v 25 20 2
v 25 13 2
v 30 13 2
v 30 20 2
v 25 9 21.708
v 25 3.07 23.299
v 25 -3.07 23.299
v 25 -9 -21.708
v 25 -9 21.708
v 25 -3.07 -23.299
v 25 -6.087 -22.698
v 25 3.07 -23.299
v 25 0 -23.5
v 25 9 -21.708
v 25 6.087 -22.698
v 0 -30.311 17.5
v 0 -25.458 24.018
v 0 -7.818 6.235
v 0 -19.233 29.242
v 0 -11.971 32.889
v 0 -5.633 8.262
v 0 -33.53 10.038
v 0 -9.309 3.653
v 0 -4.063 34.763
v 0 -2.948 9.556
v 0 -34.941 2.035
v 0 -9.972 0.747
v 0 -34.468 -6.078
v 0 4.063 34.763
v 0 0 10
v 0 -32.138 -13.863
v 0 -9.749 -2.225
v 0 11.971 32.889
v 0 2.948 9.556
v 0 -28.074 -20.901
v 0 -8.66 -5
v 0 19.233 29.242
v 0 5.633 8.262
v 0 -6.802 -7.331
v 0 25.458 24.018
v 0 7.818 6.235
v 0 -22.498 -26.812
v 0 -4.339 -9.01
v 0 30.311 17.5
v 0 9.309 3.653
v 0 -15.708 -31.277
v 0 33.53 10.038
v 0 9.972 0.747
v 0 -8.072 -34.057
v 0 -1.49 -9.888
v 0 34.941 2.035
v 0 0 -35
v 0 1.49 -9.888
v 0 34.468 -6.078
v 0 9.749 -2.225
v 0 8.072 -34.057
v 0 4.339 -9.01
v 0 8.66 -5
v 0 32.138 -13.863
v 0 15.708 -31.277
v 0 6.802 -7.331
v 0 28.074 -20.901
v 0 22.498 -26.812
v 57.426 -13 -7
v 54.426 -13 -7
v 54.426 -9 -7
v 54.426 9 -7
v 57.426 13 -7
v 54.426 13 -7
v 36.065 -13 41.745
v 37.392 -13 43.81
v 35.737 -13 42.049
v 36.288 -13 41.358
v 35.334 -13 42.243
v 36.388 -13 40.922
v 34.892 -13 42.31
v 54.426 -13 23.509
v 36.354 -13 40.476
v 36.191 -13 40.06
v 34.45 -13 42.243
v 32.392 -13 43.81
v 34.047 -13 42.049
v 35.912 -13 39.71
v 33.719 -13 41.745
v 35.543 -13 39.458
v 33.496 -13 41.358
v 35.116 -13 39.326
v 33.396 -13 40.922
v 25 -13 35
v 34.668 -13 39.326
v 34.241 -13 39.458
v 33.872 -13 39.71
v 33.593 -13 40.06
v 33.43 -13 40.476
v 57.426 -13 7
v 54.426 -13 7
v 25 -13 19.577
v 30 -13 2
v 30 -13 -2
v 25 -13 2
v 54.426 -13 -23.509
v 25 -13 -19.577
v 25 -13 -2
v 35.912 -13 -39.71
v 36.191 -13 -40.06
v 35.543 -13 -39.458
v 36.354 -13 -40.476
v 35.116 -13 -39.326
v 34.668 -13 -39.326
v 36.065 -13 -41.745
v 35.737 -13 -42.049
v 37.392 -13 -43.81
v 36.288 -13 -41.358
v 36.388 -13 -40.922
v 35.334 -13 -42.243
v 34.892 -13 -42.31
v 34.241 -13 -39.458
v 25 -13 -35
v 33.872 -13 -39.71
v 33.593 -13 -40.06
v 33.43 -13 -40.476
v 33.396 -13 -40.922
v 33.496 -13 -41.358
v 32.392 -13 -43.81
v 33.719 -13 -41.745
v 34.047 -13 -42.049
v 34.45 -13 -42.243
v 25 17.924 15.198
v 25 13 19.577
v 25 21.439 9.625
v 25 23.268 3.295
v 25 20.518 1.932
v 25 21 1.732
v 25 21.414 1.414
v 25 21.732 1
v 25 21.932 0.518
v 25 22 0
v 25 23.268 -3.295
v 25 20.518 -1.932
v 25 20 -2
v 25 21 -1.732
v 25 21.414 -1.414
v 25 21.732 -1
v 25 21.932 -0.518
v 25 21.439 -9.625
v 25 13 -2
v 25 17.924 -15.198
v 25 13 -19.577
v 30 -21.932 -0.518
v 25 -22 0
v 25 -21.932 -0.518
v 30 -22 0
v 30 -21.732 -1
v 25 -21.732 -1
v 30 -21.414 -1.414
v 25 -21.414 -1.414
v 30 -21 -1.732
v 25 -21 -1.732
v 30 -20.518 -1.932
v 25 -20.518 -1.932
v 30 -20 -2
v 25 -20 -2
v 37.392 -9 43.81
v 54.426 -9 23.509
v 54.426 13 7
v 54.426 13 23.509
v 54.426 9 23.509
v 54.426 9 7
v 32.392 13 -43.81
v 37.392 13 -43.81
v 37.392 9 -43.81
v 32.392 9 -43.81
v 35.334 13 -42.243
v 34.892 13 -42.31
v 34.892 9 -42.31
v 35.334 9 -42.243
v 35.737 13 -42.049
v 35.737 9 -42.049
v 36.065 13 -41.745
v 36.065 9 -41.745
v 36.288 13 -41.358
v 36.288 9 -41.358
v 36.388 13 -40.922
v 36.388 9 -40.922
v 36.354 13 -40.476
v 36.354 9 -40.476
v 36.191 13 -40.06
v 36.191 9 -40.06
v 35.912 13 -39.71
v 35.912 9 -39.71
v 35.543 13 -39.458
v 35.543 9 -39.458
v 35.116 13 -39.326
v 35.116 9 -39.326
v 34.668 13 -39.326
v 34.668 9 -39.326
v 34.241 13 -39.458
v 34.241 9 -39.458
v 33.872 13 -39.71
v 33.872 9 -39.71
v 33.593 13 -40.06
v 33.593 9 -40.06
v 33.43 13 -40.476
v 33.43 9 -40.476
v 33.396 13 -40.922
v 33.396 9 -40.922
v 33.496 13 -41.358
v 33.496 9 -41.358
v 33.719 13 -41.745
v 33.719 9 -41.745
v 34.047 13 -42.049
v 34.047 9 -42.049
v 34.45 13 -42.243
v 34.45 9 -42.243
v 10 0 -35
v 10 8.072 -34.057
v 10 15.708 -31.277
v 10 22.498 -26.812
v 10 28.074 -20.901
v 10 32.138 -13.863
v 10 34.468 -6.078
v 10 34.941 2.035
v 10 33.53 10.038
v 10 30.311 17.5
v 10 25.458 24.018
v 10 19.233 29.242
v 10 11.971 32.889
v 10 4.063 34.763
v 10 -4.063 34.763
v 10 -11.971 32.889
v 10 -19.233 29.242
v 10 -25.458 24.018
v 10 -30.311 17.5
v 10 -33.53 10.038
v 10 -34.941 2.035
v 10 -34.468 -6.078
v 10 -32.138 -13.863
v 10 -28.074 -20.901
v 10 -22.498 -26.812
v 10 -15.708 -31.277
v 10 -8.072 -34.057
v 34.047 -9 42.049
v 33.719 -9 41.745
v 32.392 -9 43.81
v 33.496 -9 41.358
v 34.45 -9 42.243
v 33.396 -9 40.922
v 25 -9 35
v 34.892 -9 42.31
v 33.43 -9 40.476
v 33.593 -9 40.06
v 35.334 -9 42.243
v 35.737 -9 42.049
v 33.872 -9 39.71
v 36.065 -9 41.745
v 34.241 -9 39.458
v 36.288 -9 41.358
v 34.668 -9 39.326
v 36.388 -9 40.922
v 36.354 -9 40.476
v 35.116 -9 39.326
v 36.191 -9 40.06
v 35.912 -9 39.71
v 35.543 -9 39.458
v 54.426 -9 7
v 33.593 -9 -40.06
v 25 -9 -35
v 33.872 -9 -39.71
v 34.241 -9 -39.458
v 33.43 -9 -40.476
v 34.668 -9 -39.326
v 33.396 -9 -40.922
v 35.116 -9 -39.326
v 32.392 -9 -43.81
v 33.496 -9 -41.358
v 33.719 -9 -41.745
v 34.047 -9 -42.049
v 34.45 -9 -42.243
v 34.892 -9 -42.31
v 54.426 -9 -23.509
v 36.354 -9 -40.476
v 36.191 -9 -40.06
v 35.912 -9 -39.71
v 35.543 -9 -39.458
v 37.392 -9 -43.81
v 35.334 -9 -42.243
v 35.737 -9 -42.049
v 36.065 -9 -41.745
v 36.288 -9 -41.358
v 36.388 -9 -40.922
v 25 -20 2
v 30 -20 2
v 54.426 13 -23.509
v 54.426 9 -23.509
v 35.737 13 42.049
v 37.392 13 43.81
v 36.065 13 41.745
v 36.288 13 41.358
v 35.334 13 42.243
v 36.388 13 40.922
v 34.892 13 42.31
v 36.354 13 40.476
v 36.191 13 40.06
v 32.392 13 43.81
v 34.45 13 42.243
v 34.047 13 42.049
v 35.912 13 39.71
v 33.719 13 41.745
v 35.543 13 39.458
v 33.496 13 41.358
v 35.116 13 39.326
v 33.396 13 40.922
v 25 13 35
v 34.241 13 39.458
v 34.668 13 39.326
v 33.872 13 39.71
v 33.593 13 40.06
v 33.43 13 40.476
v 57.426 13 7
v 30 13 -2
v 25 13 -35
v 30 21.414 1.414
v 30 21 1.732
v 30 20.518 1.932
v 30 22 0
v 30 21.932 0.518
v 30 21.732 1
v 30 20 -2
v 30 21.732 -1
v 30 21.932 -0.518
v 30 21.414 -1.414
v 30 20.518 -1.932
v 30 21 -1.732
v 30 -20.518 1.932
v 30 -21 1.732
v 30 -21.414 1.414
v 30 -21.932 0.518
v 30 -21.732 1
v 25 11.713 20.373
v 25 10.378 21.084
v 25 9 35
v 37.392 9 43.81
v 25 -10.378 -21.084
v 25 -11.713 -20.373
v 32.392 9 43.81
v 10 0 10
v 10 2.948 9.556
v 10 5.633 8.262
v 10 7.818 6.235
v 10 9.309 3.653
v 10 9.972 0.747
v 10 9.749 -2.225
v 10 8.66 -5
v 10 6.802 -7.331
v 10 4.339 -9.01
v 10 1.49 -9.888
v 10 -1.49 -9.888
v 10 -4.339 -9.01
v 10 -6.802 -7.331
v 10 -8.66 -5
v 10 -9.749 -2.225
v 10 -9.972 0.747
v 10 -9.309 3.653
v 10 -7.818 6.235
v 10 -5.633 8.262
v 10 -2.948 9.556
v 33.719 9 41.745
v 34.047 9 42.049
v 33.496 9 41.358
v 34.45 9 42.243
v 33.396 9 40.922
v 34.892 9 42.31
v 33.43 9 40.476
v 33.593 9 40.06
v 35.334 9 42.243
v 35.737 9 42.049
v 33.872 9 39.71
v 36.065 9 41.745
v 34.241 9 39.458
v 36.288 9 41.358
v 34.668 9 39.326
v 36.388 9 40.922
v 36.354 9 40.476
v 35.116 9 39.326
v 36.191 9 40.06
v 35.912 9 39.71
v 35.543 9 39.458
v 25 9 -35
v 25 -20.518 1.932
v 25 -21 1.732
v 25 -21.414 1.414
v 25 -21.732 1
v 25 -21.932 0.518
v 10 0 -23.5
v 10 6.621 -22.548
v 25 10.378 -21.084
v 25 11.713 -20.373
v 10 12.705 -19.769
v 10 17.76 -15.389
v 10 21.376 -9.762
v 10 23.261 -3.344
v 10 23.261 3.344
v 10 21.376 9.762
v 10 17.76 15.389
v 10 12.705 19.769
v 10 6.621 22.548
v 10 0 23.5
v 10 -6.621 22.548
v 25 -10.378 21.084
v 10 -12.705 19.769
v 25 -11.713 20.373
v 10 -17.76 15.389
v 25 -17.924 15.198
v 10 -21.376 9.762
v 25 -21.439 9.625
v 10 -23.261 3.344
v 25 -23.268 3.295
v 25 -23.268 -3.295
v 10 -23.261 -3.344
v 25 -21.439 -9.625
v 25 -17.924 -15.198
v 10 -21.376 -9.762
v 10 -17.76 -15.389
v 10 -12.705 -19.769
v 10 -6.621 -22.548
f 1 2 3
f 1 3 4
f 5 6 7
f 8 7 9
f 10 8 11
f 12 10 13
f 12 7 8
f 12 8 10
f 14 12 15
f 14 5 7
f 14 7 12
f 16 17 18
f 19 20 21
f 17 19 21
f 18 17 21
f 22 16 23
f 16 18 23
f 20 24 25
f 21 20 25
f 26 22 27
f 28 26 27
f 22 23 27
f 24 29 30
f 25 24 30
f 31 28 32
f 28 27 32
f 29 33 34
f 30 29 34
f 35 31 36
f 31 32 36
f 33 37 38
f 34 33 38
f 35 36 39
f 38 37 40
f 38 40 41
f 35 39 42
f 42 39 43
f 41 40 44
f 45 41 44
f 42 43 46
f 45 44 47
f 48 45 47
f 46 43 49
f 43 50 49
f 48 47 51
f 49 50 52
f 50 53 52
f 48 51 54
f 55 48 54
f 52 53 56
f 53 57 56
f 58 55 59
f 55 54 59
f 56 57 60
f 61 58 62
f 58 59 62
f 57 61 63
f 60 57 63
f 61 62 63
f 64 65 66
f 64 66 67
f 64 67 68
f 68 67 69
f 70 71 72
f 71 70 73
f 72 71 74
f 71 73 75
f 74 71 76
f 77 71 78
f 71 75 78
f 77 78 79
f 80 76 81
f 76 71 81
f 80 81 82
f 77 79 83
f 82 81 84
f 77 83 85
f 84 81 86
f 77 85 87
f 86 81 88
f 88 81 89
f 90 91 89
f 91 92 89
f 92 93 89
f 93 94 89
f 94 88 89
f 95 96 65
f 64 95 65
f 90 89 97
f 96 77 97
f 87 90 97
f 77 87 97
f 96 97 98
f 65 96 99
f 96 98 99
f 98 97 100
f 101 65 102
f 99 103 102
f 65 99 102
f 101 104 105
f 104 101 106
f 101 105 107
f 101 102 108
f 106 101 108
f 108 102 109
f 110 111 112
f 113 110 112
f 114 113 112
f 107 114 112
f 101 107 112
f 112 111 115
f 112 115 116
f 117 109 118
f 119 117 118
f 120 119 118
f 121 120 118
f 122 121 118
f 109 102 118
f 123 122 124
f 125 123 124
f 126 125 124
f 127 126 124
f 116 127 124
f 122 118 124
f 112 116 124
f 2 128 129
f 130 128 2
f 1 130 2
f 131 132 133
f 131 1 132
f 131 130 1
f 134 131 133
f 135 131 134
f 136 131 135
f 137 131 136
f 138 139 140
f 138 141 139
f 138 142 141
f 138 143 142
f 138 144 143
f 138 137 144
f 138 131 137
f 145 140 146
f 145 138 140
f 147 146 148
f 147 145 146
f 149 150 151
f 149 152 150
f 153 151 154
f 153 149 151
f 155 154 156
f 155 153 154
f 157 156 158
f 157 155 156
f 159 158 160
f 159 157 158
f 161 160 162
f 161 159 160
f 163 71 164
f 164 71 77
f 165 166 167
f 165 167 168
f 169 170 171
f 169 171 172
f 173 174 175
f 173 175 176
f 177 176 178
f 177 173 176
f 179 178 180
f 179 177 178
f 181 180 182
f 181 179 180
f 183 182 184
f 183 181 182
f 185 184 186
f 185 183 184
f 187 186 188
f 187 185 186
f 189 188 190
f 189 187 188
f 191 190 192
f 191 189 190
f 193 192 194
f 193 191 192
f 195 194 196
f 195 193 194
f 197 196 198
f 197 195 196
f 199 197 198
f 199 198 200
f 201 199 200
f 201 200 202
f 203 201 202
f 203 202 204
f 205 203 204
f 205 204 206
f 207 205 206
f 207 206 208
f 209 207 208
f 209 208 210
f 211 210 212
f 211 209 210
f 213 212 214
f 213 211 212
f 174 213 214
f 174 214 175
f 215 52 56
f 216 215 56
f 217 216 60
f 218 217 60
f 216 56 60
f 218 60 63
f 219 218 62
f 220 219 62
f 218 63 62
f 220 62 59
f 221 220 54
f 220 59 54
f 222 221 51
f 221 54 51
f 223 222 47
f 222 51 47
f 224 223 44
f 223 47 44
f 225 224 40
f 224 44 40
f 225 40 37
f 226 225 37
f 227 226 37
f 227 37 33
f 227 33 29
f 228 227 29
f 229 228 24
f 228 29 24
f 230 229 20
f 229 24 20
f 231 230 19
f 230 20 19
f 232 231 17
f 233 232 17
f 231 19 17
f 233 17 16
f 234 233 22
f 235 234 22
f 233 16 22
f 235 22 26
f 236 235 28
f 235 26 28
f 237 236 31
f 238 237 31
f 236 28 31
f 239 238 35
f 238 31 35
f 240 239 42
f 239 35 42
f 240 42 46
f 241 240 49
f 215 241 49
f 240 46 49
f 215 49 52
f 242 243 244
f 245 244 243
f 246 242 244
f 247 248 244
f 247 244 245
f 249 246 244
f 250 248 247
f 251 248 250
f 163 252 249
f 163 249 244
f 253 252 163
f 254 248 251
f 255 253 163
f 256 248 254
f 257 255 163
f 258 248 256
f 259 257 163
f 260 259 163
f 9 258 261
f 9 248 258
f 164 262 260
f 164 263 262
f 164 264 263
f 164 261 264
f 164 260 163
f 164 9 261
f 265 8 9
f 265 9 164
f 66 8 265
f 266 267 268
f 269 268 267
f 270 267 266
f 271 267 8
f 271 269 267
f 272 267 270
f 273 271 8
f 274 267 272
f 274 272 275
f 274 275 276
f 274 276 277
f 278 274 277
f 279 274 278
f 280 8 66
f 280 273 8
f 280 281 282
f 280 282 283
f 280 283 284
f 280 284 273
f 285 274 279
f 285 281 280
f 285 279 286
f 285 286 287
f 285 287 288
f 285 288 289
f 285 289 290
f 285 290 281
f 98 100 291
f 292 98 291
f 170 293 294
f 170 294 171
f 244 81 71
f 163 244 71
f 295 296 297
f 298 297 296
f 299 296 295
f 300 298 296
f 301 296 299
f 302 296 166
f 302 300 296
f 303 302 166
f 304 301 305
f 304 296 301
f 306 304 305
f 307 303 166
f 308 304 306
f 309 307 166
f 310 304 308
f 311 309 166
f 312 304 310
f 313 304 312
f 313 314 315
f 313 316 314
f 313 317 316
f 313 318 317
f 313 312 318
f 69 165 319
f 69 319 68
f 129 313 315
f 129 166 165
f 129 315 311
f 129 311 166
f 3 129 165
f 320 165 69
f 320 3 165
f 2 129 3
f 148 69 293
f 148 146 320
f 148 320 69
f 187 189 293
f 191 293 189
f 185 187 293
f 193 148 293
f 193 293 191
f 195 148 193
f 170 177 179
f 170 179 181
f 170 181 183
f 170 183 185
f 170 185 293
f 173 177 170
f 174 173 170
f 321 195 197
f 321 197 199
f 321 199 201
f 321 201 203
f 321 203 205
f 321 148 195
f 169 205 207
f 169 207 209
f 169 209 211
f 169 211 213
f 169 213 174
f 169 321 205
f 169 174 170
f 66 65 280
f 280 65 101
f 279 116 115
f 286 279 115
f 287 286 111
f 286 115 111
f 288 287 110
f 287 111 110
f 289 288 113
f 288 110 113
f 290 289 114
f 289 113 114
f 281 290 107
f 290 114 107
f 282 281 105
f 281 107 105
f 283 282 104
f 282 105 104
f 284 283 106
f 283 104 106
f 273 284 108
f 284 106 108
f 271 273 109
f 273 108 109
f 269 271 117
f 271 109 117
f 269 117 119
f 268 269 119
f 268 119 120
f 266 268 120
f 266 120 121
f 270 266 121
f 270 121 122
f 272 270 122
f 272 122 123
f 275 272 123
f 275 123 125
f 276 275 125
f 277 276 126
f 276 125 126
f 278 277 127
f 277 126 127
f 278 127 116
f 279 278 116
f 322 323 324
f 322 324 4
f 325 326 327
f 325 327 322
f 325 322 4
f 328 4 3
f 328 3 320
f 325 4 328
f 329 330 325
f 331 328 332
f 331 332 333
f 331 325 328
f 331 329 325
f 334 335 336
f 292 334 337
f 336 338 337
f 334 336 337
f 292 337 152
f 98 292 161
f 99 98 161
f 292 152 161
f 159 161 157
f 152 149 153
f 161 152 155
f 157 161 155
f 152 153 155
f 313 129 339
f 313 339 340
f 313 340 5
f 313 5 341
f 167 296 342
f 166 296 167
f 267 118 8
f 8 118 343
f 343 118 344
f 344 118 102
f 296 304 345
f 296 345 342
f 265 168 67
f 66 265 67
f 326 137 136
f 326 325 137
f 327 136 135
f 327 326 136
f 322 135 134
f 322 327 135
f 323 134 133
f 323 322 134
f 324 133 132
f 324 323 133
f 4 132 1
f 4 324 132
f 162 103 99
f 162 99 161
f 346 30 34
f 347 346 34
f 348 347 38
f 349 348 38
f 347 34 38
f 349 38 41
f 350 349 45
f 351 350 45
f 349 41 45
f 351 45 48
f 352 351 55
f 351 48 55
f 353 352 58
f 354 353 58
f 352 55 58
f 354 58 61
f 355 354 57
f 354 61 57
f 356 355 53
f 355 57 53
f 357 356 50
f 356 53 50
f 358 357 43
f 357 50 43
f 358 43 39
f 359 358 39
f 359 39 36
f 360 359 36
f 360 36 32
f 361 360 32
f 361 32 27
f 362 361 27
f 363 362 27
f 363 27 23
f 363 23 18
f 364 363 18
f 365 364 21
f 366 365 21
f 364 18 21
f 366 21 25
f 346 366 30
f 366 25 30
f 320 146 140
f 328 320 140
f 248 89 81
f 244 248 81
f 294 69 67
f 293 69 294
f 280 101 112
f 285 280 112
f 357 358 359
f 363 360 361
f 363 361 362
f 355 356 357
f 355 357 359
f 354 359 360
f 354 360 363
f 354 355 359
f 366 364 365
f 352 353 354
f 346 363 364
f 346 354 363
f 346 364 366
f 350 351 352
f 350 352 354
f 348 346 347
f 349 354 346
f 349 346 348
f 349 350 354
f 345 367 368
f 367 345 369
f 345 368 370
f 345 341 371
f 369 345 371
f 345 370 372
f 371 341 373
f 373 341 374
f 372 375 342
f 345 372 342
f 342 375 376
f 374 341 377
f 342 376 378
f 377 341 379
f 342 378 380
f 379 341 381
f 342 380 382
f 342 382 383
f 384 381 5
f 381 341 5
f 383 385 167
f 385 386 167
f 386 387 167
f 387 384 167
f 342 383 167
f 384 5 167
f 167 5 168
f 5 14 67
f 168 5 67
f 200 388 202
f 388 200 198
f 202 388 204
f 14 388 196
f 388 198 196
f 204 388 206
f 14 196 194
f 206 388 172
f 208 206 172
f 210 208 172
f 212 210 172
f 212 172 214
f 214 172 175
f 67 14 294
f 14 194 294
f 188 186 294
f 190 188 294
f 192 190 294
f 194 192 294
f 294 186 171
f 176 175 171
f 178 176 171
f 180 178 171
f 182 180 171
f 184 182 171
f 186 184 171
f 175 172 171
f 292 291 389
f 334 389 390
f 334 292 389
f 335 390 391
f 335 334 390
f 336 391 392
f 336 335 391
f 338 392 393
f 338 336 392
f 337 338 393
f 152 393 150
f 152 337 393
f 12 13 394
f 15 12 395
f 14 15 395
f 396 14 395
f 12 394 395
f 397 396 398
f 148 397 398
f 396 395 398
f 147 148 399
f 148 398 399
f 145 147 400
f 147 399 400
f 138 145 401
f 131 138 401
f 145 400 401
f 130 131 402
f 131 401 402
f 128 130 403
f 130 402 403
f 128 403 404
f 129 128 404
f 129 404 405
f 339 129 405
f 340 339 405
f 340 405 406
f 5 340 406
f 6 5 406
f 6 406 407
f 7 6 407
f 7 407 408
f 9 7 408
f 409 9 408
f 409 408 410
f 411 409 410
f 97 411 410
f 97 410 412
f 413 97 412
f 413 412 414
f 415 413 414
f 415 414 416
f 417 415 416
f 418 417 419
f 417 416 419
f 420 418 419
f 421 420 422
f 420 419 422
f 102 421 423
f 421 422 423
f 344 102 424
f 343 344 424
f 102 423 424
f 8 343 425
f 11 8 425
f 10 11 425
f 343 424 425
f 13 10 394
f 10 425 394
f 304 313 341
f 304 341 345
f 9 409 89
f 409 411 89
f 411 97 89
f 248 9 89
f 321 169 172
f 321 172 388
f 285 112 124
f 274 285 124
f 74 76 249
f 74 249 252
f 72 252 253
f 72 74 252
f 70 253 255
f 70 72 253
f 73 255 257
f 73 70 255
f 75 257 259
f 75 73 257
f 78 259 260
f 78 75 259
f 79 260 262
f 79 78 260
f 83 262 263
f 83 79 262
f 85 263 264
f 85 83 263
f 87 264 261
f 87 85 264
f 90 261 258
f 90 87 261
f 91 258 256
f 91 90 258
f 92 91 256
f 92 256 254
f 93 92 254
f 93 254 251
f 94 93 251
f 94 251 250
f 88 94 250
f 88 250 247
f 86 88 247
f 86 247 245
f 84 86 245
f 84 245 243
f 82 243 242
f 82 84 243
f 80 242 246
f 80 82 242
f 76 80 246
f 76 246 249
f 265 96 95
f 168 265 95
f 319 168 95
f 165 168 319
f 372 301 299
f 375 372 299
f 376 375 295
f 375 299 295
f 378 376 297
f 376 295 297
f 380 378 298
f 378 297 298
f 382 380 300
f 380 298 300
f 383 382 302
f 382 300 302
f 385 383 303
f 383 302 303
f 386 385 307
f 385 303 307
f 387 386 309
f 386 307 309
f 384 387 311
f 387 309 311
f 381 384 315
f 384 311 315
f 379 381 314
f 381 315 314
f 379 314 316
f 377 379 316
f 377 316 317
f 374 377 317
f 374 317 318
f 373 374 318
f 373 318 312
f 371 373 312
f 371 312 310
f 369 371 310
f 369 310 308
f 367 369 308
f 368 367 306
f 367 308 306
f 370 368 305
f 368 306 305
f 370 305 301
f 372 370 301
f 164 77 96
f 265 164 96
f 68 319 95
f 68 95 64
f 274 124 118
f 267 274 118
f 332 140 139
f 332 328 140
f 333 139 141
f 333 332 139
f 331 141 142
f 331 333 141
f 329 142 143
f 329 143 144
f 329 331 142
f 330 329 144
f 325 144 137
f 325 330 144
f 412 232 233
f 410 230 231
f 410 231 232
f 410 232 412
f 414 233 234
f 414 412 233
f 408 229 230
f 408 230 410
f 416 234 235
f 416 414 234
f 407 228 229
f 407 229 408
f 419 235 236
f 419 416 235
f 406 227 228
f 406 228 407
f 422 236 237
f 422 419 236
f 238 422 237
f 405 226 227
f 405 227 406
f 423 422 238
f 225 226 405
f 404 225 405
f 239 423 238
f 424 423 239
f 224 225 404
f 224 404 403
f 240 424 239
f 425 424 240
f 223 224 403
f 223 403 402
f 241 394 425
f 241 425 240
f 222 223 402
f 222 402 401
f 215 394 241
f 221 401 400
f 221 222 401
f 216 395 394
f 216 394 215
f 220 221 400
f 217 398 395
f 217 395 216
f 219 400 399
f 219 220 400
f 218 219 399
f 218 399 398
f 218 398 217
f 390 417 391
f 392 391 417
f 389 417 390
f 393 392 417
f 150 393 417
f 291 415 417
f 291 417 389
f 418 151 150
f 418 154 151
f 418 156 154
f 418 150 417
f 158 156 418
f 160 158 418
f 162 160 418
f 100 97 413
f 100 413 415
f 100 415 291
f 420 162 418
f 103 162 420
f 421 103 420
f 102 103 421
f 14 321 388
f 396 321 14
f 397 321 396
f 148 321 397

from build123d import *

# Parameters (mm, degrees)
SKETCH1_R               = 35
BOSS_EXTRUDE2_DEPTH     = 10
SKETCH3_R               = 23.5
BOSS_EXTRUDE3_DEPTH     = 15
BOSS_EXTRUDE4_DEPTH     = 4
SKETCH7_R               = 1.5
CUT_EXTRUDE1_DEPTH      = 4
MIRROR2_COPY_1_SKETCH_R = 1.5
MIRROR2_COPY_1_DEPTH    = 4
SKETCH9_W               = 4
SKETCH9_H               = 9
BOSS_EXTRUDE5_DEPTH     = 5
FILLET1_R               = 2
FILLET1_OF_MIRROR3_R    = 2
SKETCH10_W              = 14
SKETCH10_H              = 26
BOSS_EXTRUDE6_DEPTH     = 3
SKETCH11_R              = 10
CUT_EXTRUDE2_DEPTH      = 10


with BuildPart() as part:
    # Sketch1 → Boss-Extrude2 (new body)
    with BuildSketch(Plane(origin=(0, 0, 0), x_dir=(0, 0, -1), z_dir=(1, 0, 0))):
        Circle(SKETCH1_R)
    extrude(amount=BOSS_EXTRUDE2_DEPTH)

    # Sketch3 → Boss-Extrude3 (add)
    with BuildSketch(Plane(origin=(10, 0, 0), x_dir=(0, 0, -1), z_dir=(1, 0, 0))):
        Circle(SKETCH3_R)
    extrude(amount=BOSS_EXTRUDE3_DEPTH)

    # Sketch5 → Boss-Extrude4 (add)
    with BuildSketch(Plane(origin=(0, 13, 0), x_dir=(1, 0, 0), z_dir=(0, 1, 0))):
        Polygon((25, 35), (25, -35), (32.392057511, -43.809511096), (37.392057511, -43.809511096), (54.425929168, -23.509333353), (54.425929168, 23.509333353), (37.392057511, 43.809511096), (32.392057511, 43.809511096), align=None)
    boss_extrude4 = extrude(amount=-BOSS_EXTRUDE4_DEPTH)

    # Sketch7 → Cut-Extrude1 (cut)
    with BuildSketch(Plane(origin=(0, 13, 0), x_dir=(1, 0, 0), z_dir=(0, 1, 0))):
        with Locations(Location((34.892057511, -40.809511096, 0), (0, 0, 270))):
            Circle(SKETCH7_R)
    cut_extrude1 = extrude(amount=-CUT_EXTRUDE1_DEPTH, mode=Mode.SUBTRACT)

    # Mirror1: Cut-Extrude1 across plane
    add(cut_extrude1.mirror(Plane.XY), mode=Mode.SUBTRACT)

    # Mirror2: Boss-Extrude4, Cut-Extrude1 across plane
    add(boss_extrude4.mirror(Plane.ZX))
    add(cut_extrude1.mirror(Plane.ZX), mode=Mode.SUBTRACT)

    # Mirror2 copy 1 sketch → Mirror2 copy 1 (cut)
    with BuildSketch(Plane.XZ.offset(13)):
        with Locations(Location((34.892057511, -40.809511096, 0), (0, 0, 270))):
            Circle(MIRROR2_COPY_1_SKETCH_R)
    extrude(amount=-MIRROR2_COPY_1_DEPTH, mode=Mode.SUBTRACT)

    # Sketch9 → Boss-Extrude5 (add)
    with BuildSketch(Plane(origin=(25, 0, 0), x_dir=(0, 0, -1), z_dir=(1, 0, 0))):
        with Locations((0, 17.5)):
            Rectangle(SKETCH9_W, SKETCH9_H)
    boss_extrude5 = extrude(amount=BOSS_EXTRUDE5_DEPTH)

    # Fillet1
    fillet1_edges = [part.edges().sort_by_distance(p)[0] for p in [
        (27.5, 22, -2),
        (27.5, 22, 2),
    ]]
    fillet(fillet1_edges, radius=FILLET1_R - 0.0001)  # a hair under: the kernel refuses the full size

    # Mirror3: Boss-Extrude5 across plane
    add(boss_extrude5.mirror(Plane.ZX))

    # Fillet1 of Mirror3
    fillet1_of_mirror3_edges = [part.edges().sort_by_distance(p)[0] for p in [
        (27.5, -22, -2),
        (27.5, -22, 2),
    ]]
    fillet(fillet1_of_mirror3_edges, radius=FILLET1_OF_MIRROR3_R - 0.0001)  # a hair under: the kernel refuses the full size

    # Sketch10 → Boss-Extrude6 (add)
    with BuildSketch(Plane(origin=(54.425929168, 0, 0), x_dir=(0, 0, -1), z_dir=(1, 0, 0))):
        Rectangle(SKETCH10_W, SKETCH10_H)
    extrude(amount=BOSS_EXTRUDE6_DEPTH)

    # Sketch11 → Cut-Extrude2 (cut)
    with BuildSketch(Plane.ZY):
        Circle(SKETCH11_R)
    extrude(amount=-CUT_EXTRUDE2_DEPTH, mode=Mode.SUBTRACT)


solid = part.part
